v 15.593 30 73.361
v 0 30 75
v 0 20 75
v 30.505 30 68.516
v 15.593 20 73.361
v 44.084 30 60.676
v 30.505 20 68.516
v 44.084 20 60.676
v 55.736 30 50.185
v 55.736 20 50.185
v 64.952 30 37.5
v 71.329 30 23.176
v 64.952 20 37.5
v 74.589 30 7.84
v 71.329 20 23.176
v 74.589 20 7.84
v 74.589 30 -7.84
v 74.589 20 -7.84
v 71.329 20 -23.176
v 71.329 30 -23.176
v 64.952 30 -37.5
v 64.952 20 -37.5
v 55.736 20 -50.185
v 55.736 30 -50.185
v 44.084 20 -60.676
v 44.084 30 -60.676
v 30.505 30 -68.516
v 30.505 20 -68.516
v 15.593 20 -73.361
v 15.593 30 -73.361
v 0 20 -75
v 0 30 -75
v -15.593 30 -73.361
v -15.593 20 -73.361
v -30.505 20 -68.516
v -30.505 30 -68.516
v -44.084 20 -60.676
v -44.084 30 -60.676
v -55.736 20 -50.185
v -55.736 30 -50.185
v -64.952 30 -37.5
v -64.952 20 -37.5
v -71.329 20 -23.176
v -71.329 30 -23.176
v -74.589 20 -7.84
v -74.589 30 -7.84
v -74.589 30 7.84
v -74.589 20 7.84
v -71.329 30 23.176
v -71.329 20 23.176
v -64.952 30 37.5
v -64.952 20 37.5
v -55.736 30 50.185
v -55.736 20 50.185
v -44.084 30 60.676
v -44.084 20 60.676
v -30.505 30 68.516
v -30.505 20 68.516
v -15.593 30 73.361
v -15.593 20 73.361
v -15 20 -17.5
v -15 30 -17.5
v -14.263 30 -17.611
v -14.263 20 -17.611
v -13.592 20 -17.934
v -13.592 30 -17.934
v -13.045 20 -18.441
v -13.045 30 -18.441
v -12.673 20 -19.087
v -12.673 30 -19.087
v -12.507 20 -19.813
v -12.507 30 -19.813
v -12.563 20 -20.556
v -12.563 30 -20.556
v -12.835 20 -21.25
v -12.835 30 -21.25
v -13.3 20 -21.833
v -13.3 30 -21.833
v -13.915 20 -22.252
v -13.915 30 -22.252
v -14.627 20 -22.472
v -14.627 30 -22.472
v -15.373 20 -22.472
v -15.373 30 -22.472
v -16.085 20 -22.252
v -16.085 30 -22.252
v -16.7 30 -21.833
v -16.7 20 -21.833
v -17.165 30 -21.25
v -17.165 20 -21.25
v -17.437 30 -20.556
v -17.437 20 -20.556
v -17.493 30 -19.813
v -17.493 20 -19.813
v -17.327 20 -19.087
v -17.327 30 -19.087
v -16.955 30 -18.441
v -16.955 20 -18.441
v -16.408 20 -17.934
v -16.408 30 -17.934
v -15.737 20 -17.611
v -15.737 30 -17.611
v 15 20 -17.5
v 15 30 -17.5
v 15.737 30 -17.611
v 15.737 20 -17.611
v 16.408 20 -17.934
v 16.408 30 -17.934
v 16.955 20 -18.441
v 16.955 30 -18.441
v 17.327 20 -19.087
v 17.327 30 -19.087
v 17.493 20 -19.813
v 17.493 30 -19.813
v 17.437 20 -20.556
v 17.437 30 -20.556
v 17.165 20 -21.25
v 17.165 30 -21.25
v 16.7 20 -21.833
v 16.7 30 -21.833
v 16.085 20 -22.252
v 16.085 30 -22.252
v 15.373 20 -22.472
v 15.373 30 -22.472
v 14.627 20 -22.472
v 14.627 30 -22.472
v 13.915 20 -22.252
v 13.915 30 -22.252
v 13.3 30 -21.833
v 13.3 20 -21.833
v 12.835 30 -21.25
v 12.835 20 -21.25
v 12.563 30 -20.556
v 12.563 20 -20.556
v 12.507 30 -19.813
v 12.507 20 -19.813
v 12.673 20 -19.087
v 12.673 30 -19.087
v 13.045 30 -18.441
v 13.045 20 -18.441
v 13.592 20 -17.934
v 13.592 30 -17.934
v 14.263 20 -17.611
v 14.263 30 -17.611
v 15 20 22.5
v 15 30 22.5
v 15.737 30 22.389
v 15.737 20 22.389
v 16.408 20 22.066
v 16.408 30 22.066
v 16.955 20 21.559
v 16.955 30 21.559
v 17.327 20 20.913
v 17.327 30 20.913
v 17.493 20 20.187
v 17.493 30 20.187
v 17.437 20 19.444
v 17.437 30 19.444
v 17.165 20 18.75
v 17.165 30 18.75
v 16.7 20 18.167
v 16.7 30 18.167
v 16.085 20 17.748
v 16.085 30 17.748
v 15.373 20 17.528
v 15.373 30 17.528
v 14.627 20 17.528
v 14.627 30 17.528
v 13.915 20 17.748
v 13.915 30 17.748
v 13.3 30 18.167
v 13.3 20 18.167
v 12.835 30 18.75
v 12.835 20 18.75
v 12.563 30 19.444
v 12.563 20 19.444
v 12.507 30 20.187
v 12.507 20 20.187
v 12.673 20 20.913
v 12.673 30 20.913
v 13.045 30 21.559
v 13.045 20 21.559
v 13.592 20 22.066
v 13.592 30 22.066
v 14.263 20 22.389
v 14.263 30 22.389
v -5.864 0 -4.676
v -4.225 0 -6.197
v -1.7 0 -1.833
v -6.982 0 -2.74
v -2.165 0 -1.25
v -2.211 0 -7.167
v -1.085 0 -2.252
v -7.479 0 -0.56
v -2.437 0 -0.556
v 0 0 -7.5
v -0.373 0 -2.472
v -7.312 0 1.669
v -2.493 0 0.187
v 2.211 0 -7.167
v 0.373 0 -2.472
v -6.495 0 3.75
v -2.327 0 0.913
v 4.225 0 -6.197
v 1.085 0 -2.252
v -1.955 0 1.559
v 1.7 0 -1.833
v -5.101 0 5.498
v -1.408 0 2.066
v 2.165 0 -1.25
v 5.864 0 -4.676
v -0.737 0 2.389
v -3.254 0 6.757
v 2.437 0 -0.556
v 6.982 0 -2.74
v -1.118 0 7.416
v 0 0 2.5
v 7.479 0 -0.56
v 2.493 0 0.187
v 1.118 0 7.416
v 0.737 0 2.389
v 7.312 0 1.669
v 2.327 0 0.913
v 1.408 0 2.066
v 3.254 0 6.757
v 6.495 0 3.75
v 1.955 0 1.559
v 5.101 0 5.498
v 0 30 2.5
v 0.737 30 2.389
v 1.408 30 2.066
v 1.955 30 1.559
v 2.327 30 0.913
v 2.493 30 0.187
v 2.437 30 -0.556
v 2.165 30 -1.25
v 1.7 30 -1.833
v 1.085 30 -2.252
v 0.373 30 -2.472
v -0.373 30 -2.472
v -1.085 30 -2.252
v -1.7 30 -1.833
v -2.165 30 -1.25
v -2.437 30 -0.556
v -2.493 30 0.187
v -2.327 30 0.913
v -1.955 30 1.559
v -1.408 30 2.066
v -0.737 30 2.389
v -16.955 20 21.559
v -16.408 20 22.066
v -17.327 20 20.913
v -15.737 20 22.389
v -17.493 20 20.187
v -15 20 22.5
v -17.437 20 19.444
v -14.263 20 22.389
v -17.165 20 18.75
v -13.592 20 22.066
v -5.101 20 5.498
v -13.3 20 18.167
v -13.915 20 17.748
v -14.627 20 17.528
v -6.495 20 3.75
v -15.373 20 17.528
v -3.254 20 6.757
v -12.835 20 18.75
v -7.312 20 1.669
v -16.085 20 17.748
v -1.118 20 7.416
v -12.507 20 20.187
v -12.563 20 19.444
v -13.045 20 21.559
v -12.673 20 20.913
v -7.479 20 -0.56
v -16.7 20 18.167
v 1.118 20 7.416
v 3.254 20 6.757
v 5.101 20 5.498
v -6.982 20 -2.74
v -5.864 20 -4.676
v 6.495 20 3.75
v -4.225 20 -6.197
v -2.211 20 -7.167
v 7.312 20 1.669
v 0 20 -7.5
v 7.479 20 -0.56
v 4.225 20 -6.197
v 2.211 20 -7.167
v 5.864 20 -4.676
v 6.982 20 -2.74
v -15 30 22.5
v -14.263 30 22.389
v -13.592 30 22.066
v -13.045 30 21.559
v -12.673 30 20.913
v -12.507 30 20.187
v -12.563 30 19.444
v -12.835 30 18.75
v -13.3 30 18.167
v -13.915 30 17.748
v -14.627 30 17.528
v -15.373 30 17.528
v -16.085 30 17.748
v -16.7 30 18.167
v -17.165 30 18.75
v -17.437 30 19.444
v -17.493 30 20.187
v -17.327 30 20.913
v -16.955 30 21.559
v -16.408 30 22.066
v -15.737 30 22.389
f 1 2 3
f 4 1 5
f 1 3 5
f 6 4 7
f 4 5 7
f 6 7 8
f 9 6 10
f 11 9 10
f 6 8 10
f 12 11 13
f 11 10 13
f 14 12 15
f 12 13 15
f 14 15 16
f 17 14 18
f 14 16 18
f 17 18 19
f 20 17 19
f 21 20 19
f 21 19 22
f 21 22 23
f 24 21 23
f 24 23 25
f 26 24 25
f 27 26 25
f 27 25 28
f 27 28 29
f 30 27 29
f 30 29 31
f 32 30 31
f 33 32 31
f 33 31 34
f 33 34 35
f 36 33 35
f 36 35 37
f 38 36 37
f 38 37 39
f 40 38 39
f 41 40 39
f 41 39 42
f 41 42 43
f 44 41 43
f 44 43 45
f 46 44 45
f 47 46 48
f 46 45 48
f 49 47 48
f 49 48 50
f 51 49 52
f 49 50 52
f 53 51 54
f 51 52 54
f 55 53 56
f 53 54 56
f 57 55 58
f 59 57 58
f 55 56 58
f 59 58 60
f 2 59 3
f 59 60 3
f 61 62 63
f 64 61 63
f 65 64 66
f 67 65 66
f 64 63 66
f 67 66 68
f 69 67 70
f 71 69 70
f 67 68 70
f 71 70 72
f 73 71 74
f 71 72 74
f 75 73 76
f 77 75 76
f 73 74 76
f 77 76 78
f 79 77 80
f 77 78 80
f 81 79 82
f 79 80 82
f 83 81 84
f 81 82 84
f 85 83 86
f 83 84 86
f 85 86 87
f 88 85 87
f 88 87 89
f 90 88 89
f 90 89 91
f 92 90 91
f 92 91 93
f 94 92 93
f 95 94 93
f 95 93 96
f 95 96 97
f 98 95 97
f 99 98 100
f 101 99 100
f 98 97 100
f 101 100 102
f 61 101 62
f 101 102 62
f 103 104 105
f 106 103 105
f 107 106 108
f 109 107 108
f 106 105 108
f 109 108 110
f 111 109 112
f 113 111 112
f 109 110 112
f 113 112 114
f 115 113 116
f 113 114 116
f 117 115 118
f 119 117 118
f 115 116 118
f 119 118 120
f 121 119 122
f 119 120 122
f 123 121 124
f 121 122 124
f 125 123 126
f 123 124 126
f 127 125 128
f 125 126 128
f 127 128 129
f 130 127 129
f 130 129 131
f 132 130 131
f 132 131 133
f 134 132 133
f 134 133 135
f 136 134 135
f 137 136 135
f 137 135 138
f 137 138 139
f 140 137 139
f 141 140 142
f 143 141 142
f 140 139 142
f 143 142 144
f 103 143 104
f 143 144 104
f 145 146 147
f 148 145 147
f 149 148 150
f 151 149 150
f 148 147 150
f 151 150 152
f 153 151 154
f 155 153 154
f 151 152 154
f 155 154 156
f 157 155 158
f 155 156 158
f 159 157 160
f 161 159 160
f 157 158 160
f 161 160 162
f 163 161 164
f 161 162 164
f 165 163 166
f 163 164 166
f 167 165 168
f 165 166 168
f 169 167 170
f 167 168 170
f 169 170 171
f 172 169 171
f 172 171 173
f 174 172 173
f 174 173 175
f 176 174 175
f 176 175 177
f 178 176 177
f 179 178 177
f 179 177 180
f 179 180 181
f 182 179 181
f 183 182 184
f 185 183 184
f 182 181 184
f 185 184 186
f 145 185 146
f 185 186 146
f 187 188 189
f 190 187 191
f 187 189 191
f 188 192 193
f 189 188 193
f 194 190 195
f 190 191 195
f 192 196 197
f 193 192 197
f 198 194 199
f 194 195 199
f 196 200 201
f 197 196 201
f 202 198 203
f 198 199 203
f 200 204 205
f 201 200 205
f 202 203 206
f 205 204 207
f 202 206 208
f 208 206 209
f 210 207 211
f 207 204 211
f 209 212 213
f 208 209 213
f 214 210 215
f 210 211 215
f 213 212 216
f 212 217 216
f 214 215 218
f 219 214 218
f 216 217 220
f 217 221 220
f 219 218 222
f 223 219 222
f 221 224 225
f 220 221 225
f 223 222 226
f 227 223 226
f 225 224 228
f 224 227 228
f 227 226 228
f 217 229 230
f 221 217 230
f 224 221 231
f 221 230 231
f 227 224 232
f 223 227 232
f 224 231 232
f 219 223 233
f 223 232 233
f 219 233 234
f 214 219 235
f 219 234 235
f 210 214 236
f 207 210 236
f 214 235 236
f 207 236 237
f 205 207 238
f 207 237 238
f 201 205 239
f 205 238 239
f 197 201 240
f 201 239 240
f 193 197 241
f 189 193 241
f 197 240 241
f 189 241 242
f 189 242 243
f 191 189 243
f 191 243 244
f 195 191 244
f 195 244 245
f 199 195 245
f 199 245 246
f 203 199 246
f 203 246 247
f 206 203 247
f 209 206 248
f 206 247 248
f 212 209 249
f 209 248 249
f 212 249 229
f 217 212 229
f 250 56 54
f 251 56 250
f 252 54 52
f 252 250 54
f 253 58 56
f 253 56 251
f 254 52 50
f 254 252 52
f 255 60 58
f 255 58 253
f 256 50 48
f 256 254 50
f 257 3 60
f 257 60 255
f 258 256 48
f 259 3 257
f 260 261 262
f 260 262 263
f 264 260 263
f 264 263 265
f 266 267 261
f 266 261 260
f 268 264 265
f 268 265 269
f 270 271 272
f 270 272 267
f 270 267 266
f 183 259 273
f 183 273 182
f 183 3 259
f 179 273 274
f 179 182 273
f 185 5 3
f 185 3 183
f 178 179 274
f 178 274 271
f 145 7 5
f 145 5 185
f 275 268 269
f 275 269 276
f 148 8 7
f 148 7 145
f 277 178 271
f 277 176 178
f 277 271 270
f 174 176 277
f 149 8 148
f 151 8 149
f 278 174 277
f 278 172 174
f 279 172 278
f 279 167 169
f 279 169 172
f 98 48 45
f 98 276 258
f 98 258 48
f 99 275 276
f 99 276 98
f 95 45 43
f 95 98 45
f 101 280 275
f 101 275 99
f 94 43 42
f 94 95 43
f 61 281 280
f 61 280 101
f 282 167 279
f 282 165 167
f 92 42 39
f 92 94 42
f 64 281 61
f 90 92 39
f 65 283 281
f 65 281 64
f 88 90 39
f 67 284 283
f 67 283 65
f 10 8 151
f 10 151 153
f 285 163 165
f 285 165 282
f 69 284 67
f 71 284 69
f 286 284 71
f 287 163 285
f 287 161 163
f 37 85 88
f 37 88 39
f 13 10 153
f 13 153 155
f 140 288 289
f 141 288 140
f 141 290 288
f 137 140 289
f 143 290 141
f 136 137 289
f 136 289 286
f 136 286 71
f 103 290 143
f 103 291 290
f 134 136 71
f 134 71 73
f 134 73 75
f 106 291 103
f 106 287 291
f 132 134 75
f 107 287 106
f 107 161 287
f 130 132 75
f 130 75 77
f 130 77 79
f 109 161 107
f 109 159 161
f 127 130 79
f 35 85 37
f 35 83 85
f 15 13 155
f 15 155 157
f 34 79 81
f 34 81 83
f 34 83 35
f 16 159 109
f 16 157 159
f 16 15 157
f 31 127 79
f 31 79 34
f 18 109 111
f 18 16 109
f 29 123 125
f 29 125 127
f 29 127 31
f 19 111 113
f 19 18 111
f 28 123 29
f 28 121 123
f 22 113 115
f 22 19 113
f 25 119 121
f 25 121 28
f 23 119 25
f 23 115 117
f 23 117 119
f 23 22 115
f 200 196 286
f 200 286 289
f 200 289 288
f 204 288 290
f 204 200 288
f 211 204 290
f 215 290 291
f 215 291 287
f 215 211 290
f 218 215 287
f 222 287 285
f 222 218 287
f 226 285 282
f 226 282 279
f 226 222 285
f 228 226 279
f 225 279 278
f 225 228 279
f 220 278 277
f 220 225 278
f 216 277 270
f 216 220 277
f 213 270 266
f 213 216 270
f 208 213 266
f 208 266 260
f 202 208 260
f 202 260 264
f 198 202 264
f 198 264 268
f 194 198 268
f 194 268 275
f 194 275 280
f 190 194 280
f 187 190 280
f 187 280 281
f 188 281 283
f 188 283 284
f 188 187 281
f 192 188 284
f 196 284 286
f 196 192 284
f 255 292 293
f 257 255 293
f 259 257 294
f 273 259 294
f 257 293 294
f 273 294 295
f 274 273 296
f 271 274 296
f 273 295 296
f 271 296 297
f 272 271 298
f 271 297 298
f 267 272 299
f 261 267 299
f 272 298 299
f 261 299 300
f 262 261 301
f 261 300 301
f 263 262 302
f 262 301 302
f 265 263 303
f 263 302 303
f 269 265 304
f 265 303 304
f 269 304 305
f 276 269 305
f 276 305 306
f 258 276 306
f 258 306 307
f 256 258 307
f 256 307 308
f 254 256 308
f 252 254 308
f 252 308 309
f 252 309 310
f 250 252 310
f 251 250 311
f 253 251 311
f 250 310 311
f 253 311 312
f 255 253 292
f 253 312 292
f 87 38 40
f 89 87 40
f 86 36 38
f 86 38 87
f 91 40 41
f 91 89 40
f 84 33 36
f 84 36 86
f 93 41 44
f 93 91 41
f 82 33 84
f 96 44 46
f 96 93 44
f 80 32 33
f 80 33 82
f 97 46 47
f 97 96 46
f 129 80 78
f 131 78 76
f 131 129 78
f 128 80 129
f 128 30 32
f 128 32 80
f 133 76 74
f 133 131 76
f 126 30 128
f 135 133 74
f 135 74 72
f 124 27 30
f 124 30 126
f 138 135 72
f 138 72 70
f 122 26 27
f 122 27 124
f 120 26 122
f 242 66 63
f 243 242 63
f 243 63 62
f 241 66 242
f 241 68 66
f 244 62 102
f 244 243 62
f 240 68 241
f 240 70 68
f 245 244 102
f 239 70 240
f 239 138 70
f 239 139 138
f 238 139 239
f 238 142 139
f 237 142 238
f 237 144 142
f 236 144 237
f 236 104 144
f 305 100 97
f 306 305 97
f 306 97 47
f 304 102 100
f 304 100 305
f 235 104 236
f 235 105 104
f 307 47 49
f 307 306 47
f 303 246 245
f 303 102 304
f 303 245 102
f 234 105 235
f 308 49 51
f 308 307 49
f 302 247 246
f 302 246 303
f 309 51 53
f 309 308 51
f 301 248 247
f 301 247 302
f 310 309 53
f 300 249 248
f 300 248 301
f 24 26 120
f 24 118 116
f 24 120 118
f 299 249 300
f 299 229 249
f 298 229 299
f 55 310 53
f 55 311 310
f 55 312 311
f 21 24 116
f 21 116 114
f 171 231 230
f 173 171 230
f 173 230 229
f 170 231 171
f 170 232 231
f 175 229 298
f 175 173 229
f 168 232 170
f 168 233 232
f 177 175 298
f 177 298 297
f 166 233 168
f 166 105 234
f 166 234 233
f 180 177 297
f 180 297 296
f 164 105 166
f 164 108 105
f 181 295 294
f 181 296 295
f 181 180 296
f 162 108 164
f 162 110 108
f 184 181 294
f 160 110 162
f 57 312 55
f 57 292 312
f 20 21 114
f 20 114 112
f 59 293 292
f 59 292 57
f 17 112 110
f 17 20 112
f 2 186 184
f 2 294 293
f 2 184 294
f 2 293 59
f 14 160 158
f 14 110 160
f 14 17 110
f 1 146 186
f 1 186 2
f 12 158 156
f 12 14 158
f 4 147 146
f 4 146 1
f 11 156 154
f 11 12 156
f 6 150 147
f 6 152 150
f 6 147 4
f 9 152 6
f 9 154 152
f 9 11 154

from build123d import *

# Parameters (mm, degrees)
SKETCH1_R           = 75
BOSS_EXTRUDE1_DEPTH = 30
SKETCH2_R           = 75
SKETCH2_R_2         = 7.5
CUT_EXTRUDE1_DEPTH  = 20
SKETCH3_R           = 2.5
CUT_EXTRUDE2_DEPTH  = 30
SKETCH4_R           = 2.5
CUT_EXTRUDE3_DEPTH  = 10


with BuildPart() as part:
    # Sketch1 → Boss-Extrude1 (new body)
    with BuildSketch(Plane(origin=(0, 0, 0), x_dir=(1, 0, 0), z_dir=(0, 1, 0))):
        with Locations(Location((0, 0, 0), (0, 0, 270))):
            Circle(SKETCH1_R)
    extrude(amount=BOSS_EXTRUDE1_DEPTH)

    # Sketch2 → Cut-Extrude1 (cut)
    with BuildSketch(Plane.XZ):
        with Locations(Location((0, 0, 0), (0, 0, 270))):
            Circle(SKETCH2_R)
        with Locations(Location((0, 0, 0), (0, 0, 270))):
            Circle(SKETCH2_R_2, mode=Mode.SUBTRACT)
    extrude(amount=-CUT_EXTRUDE1_DEPTH, mode=Mode.SUBTRACT)

    # Sketch3 → Cut-Extrude2 (cut)
    with BuildSketch(Plane(origin=(0, 30, 0), x_dir=(1, 0, 0), z_dir=(0, 1, 0))):
        with Locations(Location((0, 0, 0), (0, 0, 270))):
            Circle(SKETCH3_R)
    extrude(amount=-CUT_EXTRUDE2_DEPTH, mode=Mode.SUBTRACT)

    # Sketch4 → Cut-Extrude3 (cut)
    with BuildSketch(Plane(origin=(0, 30, 0), x_dir=(1, 0, 0), z_dir=(0, 1, 0))):
        with Locations(Location((-15, 20, 0), (0, 0, 270))):
            Circle(SKETCH4_R)
        with Locations(Location((15, 20, 0), (0, 0, 270))):
            Circle(SKETCH4_R)
        with Locations(Location((-15, -20, 0), (0, 0, 270))):
            Circle(SKETCH4_R)
        with Locations(Location((15, -20, 0), (0, 0, 270))):
            Circle(SKETCH4_R)
    extrude(amount=-CUT_EXTRUDE3_DEPTH, mode=Mode.SUBTRACT)


solid = part.part
